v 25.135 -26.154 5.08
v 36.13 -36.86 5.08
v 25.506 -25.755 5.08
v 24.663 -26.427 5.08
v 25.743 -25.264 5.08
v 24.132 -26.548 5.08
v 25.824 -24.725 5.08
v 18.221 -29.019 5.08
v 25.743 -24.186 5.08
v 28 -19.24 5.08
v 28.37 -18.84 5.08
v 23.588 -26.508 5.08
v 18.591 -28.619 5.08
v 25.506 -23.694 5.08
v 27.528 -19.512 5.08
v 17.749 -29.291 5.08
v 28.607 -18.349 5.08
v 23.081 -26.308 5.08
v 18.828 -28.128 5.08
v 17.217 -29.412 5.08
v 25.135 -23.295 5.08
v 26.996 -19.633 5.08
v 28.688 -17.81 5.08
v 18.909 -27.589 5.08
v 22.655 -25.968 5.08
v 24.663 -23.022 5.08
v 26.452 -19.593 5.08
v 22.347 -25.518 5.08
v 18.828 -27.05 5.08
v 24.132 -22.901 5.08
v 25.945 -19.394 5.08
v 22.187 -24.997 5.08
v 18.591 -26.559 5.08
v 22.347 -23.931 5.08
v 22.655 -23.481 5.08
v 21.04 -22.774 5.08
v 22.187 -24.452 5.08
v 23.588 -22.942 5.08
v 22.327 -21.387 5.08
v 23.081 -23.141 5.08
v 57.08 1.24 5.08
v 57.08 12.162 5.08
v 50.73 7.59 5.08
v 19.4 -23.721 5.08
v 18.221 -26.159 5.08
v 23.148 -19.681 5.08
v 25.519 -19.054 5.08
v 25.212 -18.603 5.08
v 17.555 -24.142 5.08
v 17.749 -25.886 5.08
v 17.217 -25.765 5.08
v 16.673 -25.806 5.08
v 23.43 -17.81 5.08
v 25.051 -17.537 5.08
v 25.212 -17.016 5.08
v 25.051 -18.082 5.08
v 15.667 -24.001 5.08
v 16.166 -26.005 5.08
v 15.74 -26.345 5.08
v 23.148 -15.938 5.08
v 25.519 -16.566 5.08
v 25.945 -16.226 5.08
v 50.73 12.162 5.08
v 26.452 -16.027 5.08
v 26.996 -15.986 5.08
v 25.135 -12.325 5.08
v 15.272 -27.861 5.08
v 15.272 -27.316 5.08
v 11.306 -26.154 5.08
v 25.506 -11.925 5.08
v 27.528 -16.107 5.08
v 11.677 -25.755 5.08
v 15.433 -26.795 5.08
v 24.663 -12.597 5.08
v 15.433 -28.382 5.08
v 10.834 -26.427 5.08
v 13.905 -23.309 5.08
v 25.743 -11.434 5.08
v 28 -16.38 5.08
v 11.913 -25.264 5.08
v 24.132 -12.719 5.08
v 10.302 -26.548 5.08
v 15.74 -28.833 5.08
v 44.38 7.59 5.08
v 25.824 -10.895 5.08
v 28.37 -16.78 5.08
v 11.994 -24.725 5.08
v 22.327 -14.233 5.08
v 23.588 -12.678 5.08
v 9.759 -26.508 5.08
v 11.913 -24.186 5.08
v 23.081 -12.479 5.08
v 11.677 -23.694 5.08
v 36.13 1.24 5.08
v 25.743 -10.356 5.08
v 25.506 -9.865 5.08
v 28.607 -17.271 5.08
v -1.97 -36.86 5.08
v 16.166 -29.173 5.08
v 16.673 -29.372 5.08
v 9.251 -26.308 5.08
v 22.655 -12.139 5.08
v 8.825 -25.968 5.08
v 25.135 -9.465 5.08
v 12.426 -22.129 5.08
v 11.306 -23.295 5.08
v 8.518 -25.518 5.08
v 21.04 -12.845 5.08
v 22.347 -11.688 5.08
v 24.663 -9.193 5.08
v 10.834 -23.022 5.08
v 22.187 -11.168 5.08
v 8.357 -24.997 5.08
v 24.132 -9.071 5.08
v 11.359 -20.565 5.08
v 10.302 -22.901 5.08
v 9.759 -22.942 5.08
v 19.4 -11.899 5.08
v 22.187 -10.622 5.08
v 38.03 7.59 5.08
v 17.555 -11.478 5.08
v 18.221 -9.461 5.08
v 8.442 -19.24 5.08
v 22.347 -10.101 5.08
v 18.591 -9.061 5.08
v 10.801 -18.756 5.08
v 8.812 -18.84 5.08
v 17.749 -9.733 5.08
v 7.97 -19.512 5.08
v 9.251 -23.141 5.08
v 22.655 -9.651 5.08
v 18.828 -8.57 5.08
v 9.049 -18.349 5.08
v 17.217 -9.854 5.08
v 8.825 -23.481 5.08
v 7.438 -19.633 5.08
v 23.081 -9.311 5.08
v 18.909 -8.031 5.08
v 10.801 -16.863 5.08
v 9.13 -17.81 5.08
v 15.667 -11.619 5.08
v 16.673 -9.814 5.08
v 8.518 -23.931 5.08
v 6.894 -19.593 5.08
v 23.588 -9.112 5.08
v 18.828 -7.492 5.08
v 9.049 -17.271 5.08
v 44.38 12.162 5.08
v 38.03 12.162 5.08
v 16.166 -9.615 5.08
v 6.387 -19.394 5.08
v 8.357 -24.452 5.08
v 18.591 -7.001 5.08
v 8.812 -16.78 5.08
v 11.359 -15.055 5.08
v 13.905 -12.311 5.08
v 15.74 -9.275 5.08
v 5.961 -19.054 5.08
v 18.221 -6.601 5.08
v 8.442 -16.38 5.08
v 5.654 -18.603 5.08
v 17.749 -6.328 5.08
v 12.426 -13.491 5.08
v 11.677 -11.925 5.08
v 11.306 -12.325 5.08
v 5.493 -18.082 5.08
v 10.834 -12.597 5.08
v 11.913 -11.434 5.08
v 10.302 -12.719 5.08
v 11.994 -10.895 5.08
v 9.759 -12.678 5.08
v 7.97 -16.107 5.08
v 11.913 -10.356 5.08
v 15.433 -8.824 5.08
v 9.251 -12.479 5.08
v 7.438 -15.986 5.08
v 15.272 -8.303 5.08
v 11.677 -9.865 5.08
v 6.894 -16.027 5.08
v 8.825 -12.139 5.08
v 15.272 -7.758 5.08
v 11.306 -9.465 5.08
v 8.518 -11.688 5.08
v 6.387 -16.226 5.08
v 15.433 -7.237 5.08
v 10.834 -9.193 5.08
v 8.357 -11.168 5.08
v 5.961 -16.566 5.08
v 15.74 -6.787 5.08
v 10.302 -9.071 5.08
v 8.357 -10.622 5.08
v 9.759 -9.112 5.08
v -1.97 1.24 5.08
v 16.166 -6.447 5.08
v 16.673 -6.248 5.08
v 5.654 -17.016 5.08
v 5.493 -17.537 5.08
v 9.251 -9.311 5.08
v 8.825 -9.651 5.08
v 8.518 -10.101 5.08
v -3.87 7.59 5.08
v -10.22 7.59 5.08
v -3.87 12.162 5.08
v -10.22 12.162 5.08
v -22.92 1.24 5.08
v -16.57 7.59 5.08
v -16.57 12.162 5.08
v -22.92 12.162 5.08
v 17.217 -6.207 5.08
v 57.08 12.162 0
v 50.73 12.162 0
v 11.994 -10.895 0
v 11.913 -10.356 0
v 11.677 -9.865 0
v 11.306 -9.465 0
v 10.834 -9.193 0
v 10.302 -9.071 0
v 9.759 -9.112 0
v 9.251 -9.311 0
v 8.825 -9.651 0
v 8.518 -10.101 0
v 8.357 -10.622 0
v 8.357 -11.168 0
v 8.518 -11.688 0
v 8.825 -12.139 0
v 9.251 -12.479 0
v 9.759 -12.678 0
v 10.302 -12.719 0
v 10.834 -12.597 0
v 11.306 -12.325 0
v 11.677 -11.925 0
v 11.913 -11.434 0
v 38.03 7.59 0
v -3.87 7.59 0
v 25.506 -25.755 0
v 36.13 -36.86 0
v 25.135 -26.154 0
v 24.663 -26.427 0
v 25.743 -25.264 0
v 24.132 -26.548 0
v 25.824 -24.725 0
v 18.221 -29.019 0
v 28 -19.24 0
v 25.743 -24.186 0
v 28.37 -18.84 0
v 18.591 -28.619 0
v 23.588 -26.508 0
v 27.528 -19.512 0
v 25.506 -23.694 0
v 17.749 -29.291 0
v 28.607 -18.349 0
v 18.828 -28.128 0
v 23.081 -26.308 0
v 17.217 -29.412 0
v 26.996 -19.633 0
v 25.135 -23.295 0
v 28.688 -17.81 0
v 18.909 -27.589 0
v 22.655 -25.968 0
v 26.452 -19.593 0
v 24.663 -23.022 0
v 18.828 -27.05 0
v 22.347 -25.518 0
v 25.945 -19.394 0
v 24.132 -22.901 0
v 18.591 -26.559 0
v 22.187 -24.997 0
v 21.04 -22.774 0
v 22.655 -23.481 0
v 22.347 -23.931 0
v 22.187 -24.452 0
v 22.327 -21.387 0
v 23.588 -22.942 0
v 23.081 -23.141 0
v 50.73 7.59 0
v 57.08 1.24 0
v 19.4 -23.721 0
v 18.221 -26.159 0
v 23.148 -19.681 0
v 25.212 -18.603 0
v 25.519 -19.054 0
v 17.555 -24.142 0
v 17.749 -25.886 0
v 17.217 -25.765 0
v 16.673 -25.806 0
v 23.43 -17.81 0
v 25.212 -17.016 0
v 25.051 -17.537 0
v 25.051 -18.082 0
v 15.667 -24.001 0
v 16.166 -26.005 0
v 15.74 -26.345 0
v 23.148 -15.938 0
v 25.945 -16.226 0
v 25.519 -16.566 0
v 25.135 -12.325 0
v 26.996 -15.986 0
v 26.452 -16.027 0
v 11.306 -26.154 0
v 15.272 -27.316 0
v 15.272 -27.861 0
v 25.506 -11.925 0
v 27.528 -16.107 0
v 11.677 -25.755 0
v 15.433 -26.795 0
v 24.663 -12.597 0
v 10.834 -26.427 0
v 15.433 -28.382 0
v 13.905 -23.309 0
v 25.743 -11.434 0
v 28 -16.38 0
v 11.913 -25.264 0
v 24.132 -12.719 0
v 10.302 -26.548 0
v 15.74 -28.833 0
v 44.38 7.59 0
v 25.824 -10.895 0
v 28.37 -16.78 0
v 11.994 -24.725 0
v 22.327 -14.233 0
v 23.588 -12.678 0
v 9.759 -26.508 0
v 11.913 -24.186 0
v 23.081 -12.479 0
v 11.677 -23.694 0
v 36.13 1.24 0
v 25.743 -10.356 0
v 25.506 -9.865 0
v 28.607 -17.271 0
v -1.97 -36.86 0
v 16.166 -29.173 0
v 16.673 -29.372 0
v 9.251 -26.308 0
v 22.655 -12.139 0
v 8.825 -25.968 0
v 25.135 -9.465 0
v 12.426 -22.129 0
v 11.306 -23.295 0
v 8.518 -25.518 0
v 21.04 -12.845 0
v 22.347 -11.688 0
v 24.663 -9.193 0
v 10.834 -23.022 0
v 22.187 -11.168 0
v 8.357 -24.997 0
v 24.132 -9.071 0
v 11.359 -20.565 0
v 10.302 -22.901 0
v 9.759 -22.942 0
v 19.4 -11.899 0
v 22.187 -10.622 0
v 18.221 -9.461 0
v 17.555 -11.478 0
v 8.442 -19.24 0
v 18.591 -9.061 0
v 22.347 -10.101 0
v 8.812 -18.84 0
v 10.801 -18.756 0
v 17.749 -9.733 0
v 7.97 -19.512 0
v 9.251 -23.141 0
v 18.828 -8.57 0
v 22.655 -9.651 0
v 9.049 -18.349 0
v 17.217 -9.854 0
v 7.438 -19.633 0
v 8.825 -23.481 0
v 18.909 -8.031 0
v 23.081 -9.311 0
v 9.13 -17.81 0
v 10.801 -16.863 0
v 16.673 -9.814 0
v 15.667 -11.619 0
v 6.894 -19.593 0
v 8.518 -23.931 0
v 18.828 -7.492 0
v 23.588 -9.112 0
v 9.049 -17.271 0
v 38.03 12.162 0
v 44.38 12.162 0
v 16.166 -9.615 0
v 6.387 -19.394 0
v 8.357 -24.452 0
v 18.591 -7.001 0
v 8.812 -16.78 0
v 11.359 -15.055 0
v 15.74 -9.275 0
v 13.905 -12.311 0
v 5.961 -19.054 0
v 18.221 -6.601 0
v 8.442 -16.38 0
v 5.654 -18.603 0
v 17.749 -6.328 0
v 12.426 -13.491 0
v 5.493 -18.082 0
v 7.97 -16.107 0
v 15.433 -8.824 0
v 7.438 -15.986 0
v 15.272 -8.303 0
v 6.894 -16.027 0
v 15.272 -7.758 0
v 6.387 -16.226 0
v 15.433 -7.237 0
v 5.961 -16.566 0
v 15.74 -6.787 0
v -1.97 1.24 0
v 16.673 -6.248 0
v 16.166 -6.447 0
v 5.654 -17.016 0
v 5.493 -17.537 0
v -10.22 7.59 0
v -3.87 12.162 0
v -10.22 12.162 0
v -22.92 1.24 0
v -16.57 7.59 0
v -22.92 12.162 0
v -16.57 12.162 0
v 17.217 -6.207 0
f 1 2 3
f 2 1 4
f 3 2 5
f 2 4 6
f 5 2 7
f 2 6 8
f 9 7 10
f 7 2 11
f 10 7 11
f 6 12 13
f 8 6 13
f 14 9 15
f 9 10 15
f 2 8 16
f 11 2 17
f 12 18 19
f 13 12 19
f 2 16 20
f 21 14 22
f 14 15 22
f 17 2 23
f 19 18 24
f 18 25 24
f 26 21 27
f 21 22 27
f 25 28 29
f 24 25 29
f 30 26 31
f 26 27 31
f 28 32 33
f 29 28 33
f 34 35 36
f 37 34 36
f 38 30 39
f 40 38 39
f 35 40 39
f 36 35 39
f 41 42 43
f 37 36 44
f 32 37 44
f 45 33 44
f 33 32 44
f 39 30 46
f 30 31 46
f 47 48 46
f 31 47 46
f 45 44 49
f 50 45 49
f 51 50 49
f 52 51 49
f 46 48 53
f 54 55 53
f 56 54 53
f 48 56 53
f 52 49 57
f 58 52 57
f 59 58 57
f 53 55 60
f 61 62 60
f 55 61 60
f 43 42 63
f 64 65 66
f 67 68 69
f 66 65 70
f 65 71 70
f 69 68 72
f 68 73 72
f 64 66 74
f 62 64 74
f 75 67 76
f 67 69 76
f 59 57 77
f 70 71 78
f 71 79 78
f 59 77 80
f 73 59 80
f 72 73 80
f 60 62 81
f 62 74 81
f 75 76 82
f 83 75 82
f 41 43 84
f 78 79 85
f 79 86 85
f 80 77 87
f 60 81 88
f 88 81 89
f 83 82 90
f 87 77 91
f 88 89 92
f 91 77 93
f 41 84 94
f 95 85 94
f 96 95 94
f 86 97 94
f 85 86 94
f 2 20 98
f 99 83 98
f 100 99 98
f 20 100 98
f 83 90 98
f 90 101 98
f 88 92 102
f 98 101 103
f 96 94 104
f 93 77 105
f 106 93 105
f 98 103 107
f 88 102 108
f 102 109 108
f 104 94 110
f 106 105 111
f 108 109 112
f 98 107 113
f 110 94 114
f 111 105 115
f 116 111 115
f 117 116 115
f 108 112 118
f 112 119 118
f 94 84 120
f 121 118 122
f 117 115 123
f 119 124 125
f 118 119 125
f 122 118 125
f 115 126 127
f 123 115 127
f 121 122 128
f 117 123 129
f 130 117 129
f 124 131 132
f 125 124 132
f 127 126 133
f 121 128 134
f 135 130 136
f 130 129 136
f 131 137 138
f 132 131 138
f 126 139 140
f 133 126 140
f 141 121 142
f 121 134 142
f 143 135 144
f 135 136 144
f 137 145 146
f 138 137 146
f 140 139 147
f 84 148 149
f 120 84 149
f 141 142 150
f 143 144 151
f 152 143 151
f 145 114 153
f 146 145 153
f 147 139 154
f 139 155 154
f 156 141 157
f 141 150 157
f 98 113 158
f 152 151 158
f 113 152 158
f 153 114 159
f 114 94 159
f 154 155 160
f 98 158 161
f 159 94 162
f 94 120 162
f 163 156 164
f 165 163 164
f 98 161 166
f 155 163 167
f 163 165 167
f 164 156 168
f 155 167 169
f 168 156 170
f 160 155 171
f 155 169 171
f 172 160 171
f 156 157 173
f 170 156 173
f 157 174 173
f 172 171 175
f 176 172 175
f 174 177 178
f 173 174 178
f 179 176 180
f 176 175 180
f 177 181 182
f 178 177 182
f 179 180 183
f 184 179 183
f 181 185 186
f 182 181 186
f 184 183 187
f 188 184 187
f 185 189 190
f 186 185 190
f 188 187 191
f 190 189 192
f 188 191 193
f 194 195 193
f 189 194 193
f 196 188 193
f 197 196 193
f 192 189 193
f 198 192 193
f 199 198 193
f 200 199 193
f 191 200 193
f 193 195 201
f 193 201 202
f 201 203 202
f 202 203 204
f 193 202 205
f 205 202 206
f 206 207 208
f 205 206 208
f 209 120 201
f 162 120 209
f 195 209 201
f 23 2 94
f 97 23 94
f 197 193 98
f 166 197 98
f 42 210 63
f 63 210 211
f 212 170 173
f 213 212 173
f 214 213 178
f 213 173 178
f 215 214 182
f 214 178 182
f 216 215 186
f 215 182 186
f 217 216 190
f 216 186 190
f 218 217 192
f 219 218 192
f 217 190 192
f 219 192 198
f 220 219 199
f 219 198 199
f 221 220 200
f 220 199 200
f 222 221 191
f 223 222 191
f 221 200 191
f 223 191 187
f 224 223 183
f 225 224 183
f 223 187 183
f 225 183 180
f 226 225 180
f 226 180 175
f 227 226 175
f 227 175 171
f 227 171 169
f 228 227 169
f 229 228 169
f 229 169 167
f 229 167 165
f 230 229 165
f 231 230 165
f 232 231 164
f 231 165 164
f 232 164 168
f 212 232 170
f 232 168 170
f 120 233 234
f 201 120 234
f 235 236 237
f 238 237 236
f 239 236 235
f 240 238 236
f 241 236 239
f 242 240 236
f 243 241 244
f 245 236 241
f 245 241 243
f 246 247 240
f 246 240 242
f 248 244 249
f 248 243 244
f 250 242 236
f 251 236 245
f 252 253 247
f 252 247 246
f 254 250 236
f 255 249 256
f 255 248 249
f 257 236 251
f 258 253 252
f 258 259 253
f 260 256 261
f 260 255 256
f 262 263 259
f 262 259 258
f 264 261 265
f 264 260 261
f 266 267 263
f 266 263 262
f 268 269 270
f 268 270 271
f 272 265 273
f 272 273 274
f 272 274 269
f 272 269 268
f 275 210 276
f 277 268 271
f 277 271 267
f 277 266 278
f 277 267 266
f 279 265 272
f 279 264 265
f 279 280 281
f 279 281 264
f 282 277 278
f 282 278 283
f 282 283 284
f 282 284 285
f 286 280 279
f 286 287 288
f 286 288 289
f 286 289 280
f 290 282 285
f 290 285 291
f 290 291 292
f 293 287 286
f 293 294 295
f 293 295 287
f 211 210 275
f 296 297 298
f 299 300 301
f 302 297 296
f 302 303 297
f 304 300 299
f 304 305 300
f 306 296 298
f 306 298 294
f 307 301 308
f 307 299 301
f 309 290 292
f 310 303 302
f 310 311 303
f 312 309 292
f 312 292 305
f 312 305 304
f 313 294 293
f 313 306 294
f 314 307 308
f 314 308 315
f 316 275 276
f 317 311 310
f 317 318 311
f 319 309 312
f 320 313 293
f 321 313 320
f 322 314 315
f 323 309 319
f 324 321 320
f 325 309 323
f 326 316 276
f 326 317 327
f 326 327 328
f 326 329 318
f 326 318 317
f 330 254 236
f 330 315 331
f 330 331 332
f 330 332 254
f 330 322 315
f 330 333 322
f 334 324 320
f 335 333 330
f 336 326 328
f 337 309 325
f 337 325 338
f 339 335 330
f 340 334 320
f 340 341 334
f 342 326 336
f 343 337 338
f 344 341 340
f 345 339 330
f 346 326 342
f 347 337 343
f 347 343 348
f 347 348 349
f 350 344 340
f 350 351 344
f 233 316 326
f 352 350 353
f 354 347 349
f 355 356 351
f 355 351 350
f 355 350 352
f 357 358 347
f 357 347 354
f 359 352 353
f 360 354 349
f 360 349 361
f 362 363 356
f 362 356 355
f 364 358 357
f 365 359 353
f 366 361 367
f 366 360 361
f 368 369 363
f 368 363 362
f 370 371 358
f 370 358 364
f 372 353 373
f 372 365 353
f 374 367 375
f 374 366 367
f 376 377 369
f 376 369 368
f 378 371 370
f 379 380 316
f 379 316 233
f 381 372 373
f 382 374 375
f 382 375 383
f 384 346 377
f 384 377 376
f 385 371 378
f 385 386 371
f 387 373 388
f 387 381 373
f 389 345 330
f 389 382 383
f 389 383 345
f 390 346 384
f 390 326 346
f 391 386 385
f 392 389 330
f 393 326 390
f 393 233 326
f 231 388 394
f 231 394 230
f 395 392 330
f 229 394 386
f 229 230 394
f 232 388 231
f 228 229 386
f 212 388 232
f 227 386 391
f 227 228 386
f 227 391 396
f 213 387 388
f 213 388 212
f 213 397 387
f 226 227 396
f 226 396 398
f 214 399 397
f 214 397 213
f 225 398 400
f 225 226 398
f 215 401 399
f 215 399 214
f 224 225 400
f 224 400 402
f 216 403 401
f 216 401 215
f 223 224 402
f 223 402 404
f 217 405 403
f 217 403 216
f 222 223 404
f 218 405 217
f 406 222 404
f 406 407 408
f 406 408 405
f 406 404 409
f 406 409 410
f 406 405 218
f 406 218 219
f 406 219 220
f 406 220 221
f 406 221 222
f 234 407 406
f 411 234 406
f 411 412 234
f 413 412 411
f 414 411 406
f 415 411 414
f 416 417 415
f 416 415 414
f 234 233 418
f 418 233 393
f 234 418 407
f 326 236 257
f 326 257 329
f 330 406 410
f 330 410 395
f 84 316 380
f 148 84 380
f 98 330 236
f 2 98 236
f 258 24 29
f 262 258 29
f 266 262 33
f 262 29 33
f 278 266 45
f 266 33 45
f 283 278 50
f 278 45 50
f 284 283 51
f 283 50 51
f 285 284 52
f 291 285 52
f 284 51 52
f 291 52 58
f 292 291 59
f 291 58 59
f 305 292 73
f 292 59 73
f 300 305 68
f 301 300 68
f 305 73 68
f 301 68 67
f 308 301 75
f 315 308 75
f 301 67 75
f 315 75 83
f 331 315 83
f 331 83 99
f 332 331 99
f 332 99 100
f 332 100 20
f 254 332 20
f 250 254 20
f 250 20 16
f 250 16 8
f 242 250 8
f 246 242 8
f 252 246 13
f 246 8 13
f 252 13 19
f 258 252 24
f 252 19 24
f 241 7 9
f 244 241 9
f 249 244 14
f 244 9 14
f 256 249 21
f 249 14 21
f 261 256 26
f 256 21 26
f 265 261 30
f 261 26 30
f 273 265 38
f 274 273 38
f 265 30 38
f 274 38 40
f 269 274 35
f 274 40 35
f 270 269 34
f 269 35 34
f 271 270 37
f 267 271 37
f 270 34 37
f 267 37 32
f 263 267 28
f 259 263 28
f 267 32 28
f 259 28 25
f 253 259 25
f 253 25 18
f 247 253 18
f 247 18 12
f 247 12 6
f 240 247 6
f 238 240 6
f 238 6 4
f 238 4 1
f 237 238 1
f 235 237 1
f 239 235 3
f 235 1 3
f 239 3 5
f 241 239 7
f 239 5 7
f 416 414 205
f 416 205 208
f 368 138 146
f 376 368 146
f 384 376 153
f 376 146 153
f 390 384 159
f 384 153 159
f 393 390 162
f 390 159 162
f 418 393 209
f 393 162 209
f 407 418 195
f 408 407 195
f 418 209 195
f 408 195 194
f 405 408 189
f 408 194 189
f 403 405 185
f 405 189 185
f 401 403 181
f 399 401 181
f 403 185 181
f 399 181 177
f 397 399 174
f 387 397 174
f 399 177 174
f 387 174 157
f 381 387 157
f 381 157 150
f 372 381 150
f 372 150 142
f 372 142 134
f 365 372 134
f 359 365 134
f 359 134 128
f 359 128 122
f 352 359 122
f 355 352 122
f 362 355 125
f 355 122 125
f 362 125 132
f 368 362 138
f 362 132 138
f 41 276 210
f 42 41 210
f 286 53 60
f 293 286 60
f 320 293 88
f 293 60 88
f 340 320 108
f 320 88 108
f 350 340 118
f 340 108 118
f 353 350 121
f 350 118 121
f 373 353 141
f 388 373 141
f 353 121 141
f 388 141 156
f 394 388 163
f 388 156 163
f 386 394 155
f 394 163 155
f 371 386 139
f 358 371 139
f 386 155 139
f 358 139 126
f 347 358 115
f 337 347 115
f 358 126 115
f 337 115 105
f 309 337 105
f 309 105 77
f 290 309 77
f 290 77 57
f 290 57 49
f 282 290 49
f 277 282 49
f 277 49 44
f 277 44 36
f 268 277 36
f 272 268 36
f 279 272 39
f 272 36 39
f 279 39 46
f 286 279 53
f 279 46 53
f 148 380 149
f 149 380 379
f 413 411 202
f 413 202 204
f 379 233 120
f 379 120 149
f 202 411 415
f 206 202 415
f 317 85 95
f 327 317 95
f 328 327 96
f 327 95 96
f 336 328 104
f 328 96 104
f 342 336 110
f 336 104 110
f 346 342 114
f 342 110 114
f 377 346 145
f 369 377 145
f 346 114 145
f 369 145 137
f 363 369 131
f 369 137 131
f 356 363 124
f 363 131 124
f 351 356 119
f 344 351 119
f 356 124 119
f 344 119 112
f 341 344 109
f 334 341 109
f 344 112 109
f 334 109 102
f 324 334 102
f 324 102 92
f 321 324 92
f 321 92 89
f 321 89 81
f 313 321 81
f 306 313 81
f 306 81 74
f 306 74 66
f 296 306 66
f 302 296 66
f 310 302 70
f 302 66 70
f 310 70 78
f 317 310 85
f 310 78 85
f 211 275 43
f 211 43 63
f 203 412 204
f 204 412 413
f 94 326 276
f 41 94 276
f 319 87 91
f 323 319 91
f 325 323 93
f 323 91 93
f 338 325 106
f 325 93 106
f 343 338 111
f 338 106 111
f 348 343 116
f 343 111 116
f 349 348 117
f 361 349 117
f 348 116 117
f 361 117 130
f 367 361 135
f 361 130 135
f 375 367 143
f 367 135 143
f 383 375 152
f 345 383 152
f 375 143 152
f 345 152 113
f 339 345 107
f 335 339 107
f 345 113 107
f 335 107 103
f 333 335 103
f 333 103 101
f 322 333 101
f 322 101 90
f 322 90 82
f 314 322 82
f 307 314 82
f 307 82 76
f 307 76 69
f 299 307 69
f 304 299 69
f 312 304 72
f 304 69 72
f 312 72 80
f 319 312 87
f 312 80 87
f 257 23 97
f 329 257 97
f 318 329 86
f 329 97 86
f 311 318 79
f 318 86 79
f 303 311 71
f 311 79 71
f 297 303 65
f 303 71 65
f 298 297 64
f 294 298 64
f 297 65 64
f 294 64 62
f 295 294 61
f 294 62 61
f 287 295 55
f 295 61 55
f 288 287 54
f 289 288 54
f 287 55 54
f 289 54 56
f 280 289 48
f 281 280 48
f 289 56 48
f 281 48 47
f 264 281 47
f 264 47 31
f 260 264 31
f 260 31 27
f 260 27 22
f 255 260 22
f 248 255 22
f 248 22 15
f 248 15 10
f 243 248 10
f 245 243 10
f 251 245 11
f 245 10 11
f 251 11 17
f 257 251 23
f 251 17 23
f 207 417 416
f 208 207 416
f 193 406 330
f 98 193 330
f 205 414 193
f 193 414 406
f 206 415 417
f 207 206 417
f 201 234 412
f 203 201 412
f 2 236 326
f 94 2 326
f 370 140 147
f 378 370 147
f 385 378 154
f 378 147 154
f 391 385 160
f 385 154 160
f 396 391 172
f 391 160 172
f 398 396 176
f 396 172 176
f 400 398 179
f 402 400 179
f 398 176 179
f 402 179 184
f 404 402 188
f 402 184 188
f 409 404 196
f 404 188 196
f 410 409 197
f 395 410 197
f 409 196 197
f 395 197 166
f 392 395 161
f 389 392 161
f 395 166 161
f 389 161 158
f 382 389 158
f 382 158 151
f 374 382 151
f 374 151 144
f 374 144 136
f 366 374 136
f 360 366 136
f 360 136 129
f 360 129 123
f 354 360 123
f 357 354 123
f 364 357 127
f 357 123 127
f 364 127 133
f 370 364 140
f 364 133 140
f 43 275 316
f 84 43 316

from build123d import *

# Parameters (mm, degrees)
BOSS_EXTRUDE1_DEPTH = 5.08
SKETCH3_W           = 6.35
SKETCH3_H           = 4.572
BOSS_EXTRUDE2_DEPTH = 5.08
SKETCH4_R           = 6.35
SKETCH4_R_2         = 1.8288
CUT_EXTRUDE1_DEPTH  = 5.08
SKETCH5_W           = 29.19984
SKETCH5_H           = 4.572
CUT_EXTRUDE2_DEPTH  = 5.08


with BuildPart() as part:
    # Sketch1 → Boss-Extrude1 (new body)
    with BuildSketch(Plane.XY):
        Polygon((-22.91953125, 7.590234375), (-22.91953125, 1.240234375), (-1.96961125, 1.240234375), (-1.96961125, -36.859765625), (36.13038875, -36.859765625), (36.13038875, 1.240234375), (57.08030875, 1.240234375), (57.08030875, 7.590234375), align=None)
    extrude(amount=BOSS_EXTRUDE1_DEPTH)

    # Sketch3 → Boss-Extrude2 (add)
    with BuildSketch(Plane(origin=(0, 0, 0), x_dir=(-1, 0, 0), z_dir=(0, 0, -1))):
        with Locations((19.74453125, 9.876234375)):
            Rectangle(SKETCH3_W, SKETCH3_H)
        with Locations((7.04453125, 9.876234375)):
            Rectangle(SKETCH3_W, SKETCH3_H)
        with Locations((-5.65546875, 9.876234375)):
            Rectangle(SKETCH3_W, SKETCH3_H)
        with Locations((-28.50530875, 9.876234375)):
            Rectangle(SKETCH3_W, SKETCH3_H)
        with Locations((-41.20530875, 9.876234375)):
            Rectangle(SKETCH3_W, SKETCH3_H)
        with Locations((-53.90530875, 9.876234375)):
            Rectangle(SKETCH3_W, SKETCH3_H)
    extrude(amount=-BOSS_EXTRUDE2_DEPTH)

    # Sketch4 → Cut-Extrude1 (cut)
    with BuildSketch(Plane.XY.offset(5.08)):
        with Locations((17.08038875, -17.809765625)):
            Circle(SKETCH4_R)
        with Locations((7.30138875, -17.809765625)):
            Circle(SKETCH4_R_2)
        with Locations((10.165591537, -10.894968412)):
            Circle(SKETCH4_R_2)
        with Locations((17.08038875, -8.030765625)):
            Circle(SKETCH4_R_2)
        with Locations((23.995185963, -10.894968412)):
            Circle(SKETCH4_R_2)
        with Locations((26.85938875, -17.809765625)):
            Circle(SKETCH4_R_2)
        with Locations((23.995185963, -24.724562838)):
            Circle(SKETCH4_R_2)
        with Locations((17.08038875, -27.588765625)):
            Circle(SKETCH4_R_2)
        with Locations((10.165591537, -24.724562838)):
            Circle(SKETCH4_R_2)
    extrude(amount=-CUT_EXTRUDE1_DEPTH, mode=Mode.SUBTRACT)

    # Sketch5 → Cut-Extrude2 (cut)
    with BuildSketch(Plane.XY.offset(5.08)):
        with Locations((17.08038875, 9.876234375)):
            Rectangle(SKETCH5_W, SKETCH5_H)
    extrude(amount=-CUT_EXTRUDE2_DEPTH, mode=Mode.SUBTRACT)


solid = part.part
